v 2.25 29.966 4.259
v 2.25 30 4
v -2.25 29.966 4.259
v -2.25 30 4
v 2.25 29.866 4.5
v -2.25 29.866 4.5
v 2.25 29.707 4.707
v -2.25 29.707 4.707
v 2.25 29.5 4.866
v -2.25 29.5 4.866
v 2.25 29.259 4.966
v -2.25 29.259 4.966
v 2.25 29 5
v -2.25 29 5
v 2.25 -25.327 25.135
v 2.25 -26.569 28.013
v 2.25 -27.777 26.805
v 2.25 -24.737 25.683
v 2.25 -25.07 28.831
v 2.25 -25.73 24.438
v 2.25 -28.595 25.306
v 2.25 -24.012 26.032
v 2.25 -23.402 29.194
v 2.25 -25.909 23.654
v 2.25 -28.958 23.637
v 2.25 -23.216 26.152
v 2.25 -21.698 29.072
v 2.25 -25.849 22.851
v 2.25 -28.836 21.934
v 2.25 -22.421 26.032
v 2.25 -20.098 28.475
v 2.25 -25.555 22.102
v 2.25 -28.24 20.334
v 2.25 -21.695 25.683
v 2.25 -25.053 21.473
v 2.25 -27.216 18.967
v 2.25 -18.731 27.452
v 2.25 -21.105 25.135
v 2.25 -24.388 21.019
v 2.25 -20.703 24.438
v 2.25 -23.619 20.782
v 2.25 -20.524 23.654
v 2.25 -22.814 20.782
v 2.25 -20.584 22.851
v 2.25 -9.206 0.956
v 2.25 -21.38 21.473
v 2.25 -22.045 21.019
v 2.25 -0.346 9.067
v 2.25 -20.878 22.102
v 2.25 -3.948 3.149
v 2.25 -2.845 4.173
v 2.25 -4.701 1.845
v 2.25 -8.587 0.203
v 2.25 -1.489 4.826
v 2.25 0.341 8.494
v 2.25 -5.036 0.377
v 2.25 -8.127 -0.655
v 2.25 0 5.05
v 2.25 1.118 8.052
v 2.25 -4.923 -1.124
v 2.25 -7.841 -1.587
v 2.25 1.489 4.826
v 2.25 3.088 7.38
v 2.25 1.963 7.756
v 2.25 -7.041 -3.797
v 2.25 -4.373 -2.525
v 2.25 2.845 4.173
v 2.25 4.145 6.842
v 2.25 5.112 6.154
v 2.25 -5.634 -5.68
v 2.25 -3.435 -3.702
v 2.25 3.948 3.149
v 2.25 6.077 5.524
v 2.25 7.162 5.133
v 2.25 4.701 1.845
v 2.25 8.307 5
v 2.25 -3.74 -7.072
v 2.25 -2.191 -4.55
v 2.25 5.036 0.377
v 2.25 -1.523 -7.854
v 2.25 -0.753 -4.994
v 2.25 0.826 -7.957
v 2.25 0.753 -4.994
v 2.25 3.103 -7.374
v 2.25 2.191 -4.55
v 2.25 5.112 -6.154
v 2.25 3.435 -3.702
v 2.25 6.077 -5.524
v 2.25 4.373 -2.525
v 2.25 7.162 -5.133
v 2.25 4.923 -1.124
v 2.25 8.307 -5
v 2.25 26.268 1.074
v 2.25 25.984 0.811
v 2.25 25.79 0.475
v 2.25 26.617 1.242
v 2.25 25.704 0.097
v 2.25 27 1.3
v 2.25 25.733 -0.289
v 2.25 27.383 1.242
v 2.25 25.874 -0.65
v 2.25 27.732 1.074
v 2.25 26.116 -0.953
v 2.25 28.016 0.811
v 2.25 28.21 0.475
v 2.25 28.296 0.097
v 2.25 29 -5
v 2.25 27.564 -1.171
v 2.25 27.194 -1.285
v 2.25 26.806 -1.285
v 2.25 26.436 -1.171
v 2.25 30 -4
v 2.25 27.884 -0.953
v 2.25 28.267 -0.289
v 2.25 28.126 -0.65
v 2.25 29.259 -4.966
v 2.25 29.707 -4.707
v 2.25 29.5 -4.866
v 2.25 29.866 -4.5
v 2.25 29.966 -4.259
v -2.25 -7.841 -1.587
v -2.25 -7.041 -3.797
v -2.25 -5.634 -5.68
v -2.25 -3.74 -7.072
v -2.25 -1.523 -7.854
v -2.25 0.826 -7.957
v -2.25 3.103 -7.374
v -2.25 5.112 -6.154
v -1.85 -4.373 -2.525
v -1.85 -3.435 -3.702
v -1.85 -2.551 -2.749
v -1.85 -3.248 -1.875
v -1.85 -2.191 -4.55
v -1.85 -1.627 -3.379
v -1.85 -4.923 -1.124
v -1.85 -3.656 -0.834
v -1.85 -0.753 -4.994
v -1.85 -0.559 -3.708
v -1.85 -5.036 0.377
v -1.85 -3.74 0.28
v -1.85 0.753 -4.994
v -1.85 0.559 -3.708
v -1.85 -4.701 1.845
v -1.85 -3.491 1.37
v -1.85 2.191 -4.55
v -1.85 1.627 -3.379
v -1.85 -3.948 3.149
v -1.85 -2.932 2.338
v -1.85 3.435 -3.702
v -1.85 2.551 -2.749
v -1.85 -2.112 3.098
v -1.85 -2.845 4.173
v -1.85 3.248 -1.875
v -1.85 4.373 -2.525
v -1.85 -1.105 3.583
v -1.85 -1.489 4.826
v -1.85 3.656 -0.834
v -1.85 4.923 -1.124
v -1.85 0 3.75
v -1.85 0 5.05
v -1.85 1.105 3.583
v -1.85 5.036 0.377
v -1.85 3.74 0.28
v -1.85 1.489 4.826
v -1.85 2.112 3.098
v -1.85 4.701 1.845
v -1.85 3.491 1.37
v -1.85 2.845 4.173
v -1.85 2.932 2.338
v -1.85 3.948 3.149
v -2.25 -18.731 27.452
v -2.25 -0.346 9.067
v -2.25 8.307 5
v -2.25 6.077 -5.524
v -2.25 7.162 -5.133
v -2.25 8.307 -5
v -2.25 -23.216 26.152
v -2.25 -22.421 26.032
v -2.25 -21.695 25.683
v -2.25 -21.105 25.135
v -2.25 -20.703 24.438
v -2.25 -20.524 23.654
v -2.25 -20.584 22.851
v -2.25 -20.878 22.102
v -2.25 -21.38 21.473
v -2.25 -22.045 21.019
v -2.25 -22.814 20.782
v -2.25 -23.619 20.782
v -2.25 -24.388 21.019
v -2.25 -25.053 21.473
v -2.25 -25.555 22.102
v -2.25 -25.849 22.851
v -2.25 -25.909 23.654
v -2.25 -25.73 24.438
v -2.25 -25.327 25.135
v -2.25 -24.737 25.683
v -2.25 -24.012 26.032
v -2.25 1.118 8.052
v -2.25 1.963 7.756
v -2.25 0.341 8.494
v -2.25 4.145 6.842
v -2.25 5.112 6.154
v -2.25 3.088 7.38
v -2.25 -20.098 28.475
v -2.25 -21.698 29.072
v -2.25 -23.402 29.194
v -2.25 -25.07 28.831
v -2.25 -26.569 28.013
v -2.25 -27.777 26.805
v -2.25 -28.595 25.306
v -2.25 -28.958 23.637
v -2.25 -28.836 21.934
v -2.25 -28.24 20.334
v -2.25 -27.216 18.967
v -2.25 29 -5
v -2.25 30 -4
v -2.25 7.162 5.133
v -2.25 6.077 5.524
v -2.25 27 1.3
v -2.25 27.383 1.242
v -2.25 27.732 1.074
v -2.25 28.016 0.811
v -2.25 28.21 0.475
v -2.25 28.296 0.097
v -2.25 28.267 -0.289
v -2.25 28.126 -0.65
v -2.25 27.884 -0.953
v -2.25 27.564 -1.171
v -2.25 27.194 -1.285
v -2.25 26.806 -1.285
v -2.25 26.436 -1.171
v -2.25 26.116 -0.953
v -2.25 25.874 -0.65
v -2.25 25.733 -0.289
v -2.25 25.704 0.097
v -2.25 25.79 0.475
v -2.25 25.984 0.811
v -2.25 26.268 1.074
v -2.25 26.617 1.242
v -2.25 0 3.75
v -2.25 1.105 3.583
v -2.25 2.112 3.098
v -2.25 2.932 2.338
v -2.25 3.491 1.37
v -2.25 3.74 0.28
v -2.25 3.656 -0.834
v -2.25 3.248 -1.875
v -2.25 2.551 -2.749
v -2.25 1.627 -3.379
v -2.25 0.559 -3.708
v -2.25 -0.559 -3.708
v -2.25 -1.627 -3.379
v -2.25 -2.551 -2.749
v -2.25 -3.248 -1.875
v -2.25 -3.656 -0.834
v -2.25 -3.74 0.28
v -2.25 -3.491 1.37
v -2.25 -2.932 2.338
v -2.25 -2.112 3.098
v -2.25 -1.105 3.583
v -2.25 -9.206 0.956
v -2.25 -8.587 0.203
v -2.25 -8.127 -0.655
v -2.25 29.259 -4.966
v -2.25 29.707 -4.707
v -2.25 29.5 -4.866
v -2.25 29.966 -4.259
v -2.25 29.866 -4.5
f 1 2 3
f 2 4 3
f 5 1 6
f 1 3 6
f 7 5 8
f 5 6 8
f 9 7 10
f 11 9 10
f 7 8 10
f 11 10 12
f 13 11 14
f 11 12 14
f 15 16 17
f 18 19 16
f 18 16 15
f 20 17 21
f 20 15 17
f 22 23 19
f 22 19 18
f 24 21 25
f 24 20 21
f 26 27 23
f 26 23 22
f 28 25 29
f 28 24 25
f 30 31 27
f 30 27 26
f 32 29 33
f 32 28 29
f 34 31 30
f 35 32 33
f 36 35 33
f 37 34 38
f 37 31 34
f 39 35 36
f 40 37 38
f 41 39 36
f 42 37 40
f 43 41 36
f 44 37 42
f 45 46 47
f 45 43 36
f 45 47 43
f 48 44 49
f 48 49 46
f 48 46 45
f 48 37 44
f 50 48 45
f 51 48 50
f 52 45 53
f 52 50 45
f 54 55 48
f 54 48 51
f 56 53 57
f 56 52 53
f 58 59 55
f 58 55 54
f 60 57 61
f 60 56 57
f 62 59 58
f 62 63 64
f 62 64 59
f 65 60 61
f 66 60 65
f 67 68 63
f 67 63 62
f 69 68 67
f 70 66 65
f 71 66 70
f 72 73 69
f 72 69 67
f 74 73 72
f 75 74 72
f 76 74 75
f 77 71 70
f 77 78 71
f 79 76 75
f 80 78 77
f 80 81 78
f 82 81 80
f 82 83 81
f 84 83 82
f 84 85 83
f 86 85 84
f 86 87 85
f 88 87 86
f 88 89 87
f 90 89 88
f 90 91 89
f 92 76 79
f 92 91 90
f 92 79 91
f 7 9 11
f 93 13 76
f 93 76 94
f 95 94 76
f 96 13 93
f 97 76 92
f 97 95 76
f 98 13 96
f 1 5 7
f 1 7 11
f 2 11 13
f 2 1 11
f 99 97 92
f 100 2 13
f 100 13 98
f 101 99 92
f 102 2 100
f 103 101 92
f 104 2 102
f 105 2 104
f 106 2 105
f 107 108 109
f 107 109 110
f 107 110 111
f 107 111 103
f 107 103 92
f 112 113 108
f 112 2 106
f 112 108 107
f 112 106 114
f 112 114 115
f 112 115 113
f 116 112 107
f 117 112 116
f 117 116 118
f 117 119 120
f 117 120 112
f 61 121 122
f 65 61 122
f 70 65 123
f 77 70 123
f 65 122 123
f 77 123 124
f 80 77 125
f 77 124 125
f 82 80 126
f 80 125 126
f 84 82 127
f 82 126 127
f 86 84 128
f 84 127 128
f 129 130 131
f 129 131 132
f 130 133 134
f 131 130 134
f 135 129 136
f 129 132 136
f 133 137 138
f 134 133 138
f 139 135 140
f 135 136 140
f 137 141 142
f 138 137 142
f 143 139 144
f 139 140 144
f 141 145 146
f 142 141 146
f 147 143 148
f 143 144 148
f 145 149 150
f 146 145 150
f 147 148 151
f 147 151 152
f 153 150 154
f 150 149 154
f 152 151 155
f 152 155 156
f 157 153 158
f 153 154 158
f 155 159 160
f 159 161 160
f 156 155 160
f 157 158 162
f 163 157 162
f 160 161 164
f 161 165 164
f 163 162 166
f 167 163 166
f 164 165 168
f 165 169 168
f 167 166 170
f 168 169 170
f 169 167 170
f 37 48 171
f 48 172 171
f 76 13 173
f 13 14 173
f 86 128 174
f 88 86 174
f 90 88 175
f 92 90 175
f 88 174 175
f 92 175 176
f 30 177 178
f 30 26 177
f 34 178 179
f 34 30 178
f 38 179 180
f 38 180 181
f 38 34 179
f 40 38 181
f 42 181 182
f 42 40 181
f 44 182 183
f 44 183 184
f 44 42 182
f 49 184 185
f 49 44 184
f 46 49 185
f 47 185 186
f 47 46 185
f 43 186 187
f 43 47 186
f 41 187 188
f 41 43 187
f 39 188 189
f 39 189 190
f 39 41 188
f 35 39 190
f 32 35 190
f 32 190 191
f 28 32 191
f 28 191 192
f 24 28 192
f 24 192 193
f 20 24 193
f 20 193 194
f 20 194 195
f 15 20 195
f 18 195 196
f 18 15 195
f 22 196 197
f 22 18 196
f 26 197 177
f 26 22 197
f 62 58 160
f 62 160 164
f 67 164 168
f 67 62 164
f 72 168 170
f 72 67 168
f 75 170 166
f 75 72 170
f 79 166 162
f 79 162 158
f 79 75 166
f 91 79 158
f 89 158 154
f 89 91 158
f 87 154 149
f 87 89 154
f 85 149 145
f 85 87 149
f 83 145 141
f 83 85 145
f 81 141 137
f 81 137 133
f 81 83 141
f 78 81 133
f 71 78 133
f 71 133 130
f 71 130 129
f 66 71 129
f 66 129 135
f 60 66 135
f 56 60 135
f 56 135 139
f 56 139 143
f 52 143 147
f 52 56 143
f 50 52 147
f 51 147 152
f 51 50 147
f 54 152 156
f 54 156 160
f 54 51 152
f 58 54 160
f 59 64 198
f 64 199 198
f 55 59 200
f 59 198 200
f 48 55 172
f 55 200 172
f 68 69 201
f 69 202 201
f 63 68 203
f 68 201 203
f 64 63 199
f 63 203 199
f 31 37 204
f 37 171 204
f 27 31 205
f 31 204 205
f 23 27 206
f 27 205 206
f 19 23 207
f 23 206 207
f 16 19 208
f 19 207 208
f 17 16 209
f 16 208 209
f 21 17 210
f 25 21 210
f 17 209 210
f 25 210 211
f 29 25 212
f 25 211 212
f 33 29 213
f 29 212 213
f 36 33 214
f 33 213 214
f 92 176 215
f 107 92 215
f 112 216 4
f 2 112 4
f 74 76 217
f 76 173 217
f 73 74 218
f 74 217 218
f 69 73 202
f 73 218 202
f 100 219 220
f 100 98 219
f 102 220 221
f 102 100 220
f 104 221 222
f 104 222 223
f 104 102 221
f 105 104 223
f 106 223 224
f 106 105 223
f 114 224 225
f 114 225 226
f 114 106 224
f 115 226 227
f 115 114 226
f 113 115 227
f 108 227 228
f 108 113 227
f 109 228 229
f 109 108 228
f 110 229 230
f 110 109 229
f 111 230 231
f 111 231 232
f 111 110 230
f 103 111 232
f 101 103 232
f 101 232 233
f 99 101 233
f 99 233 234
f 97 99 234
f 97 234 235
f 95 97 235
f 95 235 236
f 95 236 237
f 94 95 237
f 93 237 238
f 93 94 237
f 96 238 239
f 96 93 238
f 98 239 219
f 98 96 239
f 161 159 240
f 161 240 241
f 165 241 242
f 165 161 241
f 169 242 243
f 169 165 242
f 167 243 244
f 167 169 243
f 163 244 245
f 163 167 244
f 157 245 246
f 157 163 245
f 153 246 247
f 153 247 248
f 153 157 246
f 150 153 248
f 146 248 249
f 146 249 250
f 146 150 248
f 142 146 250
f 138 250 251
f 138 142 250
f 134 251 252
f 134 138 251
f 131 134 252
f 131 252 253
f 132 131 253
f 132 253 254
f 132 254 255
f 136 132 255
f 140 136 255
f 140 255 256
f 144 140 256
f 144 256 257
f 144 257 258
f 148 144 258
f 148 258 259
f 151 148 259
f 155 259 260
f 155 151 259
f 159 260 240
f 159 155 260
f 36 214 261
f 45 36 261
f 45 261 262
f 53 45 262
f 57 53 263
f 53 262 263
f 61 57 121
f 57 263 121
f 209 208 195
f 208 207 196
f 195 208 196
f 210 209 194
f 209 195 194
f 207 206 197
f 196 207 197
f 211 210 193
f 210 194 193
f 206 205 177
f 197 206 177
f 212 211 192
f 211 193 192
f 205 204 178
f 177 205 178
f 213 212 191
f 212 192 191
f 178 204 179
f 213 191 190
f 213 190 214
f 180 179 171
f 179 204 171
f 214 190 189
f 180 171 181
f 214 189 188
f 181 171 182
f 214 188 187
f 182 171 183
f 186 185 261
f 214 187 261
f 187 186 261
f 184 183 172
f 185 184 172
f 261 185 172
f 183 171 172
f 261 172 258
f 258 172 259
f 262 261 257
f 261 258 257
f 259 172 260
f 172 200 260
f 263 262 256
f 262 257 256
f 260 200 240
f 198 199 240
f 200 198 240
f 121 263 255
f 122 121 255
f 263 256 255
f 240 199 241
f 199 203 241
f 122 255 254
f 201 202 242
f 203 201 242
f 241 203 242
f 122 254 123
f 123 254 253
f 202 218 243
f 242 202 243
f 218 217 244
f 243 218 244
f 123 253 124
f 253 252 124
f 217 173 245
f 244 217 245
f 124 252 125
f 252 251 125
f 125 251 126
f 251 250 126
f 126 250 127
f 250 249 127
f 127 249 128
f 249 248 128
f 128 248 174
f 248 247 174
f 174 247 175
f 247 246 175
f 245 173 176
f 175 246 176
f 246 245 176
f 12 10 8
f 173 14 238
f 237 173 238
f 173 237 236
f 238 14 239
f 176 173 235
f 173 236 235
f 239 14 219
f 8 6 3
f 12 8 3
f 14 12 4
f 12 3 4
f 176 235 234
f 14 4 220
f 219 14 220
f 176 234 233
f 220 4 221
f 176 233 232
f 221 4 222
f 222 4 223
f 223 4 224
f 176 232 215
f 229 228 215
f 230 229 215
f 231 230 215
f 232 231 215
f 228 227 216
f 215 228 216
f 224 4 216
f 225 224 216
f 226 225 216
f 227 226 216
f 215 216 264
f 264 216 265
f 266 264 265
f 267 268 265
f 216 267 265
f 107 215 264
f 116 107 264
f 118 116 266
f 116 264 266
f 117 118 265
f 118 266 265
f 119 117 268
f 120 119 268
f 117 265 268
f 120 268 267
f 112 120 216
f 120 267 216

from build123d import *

# Parameters (mm, degrees)
SKETCH_1_R          = 3.75
SKETCH_1_R_2        = 1.3
SKETCH_1_R_3        = 2.7
EXTRUDE_1_DEPTH     = 2.25
SKETCH_7_R          = 5.05
CUT_EXTRUDE_4_DEPTH = 4.1


with BuildPart() as part:
    # 草图1 → 凸台-拉伸1 (new body, symmetric)
    with BuildSketch(Plane.ZY):
        with BuildLine():
            Line((-4, 30), (4, 30))
            ThreePointArc((4, 30), (4.707106781, 29.707106781), (5, 29))
            Line((5, 29), (5, 8.306623863))
            ThreePointArc((5, 8.306623863), (5.297300284, 6.608208312), (6.153846154, 5.111768531))
            ThreePointArc((6.153846154, 5.111768531), (7.130688706, 3.626744901), (7.755507367, 1.962678138))
            ThreePointArc((7.755507367, 1.962678138), (8.255259703, 0.719581246), (9.067165566, -0.346181931))
            Line((9.067165566, -0.346181931), (27.451942184, -18.730958549))
            ThreePointArc((27.451942184, -18.730958549), (27.451942184, -27.216239924), (18.96666081, -27.216239924))
            Line((18.96666081, -27.216239924), (0.956494183, -9.206073297))
            ThreePointArc((0.956494183, -9.206073297), (-0.214644447, -8.335970475), (-1.587101368, -7.840989048))
            ThreePointArc((-1.587101368, -7.840989048), (-7.544802804, -2.660065909), (-6.153846154, 5.111768531))
            ThreePointArc((-6.153846154, 5.111768531), (-5.297300284, 6.608208312), (-5, 8.306623863))
            Line((-5, 8.306623863), (-5, 29))
            ThreePointArc((-5, 29), (-4.707106781, 29.707106781), (-4, 30))
        make_face()
        Circle(SKETCH_1_R, mode=Mode.SUBTRACT)
        with Locations((0, 27)):
            Circle(SKETCH_1_R_2, mode=Mode.SUBTRACT)
        with Locations((23.452077304, -23.216375043)):
            Circle(SKETCH_1_R_3, mode=Mode.SUBTRACT)
    extrude(amount=EXTRUDE_1_DEPTH, both=True)

    # 草图7 → 切除-拉伸4 (cut)
    with BuildSketch(Plane.ZY.offset(-2.25)):
        Circle(SKETCH_7_R)
    extrude(amount=CUT_EXTRUDE_4_DEPTH, mode=Mode.SUBTRACT)


solid = part.part
